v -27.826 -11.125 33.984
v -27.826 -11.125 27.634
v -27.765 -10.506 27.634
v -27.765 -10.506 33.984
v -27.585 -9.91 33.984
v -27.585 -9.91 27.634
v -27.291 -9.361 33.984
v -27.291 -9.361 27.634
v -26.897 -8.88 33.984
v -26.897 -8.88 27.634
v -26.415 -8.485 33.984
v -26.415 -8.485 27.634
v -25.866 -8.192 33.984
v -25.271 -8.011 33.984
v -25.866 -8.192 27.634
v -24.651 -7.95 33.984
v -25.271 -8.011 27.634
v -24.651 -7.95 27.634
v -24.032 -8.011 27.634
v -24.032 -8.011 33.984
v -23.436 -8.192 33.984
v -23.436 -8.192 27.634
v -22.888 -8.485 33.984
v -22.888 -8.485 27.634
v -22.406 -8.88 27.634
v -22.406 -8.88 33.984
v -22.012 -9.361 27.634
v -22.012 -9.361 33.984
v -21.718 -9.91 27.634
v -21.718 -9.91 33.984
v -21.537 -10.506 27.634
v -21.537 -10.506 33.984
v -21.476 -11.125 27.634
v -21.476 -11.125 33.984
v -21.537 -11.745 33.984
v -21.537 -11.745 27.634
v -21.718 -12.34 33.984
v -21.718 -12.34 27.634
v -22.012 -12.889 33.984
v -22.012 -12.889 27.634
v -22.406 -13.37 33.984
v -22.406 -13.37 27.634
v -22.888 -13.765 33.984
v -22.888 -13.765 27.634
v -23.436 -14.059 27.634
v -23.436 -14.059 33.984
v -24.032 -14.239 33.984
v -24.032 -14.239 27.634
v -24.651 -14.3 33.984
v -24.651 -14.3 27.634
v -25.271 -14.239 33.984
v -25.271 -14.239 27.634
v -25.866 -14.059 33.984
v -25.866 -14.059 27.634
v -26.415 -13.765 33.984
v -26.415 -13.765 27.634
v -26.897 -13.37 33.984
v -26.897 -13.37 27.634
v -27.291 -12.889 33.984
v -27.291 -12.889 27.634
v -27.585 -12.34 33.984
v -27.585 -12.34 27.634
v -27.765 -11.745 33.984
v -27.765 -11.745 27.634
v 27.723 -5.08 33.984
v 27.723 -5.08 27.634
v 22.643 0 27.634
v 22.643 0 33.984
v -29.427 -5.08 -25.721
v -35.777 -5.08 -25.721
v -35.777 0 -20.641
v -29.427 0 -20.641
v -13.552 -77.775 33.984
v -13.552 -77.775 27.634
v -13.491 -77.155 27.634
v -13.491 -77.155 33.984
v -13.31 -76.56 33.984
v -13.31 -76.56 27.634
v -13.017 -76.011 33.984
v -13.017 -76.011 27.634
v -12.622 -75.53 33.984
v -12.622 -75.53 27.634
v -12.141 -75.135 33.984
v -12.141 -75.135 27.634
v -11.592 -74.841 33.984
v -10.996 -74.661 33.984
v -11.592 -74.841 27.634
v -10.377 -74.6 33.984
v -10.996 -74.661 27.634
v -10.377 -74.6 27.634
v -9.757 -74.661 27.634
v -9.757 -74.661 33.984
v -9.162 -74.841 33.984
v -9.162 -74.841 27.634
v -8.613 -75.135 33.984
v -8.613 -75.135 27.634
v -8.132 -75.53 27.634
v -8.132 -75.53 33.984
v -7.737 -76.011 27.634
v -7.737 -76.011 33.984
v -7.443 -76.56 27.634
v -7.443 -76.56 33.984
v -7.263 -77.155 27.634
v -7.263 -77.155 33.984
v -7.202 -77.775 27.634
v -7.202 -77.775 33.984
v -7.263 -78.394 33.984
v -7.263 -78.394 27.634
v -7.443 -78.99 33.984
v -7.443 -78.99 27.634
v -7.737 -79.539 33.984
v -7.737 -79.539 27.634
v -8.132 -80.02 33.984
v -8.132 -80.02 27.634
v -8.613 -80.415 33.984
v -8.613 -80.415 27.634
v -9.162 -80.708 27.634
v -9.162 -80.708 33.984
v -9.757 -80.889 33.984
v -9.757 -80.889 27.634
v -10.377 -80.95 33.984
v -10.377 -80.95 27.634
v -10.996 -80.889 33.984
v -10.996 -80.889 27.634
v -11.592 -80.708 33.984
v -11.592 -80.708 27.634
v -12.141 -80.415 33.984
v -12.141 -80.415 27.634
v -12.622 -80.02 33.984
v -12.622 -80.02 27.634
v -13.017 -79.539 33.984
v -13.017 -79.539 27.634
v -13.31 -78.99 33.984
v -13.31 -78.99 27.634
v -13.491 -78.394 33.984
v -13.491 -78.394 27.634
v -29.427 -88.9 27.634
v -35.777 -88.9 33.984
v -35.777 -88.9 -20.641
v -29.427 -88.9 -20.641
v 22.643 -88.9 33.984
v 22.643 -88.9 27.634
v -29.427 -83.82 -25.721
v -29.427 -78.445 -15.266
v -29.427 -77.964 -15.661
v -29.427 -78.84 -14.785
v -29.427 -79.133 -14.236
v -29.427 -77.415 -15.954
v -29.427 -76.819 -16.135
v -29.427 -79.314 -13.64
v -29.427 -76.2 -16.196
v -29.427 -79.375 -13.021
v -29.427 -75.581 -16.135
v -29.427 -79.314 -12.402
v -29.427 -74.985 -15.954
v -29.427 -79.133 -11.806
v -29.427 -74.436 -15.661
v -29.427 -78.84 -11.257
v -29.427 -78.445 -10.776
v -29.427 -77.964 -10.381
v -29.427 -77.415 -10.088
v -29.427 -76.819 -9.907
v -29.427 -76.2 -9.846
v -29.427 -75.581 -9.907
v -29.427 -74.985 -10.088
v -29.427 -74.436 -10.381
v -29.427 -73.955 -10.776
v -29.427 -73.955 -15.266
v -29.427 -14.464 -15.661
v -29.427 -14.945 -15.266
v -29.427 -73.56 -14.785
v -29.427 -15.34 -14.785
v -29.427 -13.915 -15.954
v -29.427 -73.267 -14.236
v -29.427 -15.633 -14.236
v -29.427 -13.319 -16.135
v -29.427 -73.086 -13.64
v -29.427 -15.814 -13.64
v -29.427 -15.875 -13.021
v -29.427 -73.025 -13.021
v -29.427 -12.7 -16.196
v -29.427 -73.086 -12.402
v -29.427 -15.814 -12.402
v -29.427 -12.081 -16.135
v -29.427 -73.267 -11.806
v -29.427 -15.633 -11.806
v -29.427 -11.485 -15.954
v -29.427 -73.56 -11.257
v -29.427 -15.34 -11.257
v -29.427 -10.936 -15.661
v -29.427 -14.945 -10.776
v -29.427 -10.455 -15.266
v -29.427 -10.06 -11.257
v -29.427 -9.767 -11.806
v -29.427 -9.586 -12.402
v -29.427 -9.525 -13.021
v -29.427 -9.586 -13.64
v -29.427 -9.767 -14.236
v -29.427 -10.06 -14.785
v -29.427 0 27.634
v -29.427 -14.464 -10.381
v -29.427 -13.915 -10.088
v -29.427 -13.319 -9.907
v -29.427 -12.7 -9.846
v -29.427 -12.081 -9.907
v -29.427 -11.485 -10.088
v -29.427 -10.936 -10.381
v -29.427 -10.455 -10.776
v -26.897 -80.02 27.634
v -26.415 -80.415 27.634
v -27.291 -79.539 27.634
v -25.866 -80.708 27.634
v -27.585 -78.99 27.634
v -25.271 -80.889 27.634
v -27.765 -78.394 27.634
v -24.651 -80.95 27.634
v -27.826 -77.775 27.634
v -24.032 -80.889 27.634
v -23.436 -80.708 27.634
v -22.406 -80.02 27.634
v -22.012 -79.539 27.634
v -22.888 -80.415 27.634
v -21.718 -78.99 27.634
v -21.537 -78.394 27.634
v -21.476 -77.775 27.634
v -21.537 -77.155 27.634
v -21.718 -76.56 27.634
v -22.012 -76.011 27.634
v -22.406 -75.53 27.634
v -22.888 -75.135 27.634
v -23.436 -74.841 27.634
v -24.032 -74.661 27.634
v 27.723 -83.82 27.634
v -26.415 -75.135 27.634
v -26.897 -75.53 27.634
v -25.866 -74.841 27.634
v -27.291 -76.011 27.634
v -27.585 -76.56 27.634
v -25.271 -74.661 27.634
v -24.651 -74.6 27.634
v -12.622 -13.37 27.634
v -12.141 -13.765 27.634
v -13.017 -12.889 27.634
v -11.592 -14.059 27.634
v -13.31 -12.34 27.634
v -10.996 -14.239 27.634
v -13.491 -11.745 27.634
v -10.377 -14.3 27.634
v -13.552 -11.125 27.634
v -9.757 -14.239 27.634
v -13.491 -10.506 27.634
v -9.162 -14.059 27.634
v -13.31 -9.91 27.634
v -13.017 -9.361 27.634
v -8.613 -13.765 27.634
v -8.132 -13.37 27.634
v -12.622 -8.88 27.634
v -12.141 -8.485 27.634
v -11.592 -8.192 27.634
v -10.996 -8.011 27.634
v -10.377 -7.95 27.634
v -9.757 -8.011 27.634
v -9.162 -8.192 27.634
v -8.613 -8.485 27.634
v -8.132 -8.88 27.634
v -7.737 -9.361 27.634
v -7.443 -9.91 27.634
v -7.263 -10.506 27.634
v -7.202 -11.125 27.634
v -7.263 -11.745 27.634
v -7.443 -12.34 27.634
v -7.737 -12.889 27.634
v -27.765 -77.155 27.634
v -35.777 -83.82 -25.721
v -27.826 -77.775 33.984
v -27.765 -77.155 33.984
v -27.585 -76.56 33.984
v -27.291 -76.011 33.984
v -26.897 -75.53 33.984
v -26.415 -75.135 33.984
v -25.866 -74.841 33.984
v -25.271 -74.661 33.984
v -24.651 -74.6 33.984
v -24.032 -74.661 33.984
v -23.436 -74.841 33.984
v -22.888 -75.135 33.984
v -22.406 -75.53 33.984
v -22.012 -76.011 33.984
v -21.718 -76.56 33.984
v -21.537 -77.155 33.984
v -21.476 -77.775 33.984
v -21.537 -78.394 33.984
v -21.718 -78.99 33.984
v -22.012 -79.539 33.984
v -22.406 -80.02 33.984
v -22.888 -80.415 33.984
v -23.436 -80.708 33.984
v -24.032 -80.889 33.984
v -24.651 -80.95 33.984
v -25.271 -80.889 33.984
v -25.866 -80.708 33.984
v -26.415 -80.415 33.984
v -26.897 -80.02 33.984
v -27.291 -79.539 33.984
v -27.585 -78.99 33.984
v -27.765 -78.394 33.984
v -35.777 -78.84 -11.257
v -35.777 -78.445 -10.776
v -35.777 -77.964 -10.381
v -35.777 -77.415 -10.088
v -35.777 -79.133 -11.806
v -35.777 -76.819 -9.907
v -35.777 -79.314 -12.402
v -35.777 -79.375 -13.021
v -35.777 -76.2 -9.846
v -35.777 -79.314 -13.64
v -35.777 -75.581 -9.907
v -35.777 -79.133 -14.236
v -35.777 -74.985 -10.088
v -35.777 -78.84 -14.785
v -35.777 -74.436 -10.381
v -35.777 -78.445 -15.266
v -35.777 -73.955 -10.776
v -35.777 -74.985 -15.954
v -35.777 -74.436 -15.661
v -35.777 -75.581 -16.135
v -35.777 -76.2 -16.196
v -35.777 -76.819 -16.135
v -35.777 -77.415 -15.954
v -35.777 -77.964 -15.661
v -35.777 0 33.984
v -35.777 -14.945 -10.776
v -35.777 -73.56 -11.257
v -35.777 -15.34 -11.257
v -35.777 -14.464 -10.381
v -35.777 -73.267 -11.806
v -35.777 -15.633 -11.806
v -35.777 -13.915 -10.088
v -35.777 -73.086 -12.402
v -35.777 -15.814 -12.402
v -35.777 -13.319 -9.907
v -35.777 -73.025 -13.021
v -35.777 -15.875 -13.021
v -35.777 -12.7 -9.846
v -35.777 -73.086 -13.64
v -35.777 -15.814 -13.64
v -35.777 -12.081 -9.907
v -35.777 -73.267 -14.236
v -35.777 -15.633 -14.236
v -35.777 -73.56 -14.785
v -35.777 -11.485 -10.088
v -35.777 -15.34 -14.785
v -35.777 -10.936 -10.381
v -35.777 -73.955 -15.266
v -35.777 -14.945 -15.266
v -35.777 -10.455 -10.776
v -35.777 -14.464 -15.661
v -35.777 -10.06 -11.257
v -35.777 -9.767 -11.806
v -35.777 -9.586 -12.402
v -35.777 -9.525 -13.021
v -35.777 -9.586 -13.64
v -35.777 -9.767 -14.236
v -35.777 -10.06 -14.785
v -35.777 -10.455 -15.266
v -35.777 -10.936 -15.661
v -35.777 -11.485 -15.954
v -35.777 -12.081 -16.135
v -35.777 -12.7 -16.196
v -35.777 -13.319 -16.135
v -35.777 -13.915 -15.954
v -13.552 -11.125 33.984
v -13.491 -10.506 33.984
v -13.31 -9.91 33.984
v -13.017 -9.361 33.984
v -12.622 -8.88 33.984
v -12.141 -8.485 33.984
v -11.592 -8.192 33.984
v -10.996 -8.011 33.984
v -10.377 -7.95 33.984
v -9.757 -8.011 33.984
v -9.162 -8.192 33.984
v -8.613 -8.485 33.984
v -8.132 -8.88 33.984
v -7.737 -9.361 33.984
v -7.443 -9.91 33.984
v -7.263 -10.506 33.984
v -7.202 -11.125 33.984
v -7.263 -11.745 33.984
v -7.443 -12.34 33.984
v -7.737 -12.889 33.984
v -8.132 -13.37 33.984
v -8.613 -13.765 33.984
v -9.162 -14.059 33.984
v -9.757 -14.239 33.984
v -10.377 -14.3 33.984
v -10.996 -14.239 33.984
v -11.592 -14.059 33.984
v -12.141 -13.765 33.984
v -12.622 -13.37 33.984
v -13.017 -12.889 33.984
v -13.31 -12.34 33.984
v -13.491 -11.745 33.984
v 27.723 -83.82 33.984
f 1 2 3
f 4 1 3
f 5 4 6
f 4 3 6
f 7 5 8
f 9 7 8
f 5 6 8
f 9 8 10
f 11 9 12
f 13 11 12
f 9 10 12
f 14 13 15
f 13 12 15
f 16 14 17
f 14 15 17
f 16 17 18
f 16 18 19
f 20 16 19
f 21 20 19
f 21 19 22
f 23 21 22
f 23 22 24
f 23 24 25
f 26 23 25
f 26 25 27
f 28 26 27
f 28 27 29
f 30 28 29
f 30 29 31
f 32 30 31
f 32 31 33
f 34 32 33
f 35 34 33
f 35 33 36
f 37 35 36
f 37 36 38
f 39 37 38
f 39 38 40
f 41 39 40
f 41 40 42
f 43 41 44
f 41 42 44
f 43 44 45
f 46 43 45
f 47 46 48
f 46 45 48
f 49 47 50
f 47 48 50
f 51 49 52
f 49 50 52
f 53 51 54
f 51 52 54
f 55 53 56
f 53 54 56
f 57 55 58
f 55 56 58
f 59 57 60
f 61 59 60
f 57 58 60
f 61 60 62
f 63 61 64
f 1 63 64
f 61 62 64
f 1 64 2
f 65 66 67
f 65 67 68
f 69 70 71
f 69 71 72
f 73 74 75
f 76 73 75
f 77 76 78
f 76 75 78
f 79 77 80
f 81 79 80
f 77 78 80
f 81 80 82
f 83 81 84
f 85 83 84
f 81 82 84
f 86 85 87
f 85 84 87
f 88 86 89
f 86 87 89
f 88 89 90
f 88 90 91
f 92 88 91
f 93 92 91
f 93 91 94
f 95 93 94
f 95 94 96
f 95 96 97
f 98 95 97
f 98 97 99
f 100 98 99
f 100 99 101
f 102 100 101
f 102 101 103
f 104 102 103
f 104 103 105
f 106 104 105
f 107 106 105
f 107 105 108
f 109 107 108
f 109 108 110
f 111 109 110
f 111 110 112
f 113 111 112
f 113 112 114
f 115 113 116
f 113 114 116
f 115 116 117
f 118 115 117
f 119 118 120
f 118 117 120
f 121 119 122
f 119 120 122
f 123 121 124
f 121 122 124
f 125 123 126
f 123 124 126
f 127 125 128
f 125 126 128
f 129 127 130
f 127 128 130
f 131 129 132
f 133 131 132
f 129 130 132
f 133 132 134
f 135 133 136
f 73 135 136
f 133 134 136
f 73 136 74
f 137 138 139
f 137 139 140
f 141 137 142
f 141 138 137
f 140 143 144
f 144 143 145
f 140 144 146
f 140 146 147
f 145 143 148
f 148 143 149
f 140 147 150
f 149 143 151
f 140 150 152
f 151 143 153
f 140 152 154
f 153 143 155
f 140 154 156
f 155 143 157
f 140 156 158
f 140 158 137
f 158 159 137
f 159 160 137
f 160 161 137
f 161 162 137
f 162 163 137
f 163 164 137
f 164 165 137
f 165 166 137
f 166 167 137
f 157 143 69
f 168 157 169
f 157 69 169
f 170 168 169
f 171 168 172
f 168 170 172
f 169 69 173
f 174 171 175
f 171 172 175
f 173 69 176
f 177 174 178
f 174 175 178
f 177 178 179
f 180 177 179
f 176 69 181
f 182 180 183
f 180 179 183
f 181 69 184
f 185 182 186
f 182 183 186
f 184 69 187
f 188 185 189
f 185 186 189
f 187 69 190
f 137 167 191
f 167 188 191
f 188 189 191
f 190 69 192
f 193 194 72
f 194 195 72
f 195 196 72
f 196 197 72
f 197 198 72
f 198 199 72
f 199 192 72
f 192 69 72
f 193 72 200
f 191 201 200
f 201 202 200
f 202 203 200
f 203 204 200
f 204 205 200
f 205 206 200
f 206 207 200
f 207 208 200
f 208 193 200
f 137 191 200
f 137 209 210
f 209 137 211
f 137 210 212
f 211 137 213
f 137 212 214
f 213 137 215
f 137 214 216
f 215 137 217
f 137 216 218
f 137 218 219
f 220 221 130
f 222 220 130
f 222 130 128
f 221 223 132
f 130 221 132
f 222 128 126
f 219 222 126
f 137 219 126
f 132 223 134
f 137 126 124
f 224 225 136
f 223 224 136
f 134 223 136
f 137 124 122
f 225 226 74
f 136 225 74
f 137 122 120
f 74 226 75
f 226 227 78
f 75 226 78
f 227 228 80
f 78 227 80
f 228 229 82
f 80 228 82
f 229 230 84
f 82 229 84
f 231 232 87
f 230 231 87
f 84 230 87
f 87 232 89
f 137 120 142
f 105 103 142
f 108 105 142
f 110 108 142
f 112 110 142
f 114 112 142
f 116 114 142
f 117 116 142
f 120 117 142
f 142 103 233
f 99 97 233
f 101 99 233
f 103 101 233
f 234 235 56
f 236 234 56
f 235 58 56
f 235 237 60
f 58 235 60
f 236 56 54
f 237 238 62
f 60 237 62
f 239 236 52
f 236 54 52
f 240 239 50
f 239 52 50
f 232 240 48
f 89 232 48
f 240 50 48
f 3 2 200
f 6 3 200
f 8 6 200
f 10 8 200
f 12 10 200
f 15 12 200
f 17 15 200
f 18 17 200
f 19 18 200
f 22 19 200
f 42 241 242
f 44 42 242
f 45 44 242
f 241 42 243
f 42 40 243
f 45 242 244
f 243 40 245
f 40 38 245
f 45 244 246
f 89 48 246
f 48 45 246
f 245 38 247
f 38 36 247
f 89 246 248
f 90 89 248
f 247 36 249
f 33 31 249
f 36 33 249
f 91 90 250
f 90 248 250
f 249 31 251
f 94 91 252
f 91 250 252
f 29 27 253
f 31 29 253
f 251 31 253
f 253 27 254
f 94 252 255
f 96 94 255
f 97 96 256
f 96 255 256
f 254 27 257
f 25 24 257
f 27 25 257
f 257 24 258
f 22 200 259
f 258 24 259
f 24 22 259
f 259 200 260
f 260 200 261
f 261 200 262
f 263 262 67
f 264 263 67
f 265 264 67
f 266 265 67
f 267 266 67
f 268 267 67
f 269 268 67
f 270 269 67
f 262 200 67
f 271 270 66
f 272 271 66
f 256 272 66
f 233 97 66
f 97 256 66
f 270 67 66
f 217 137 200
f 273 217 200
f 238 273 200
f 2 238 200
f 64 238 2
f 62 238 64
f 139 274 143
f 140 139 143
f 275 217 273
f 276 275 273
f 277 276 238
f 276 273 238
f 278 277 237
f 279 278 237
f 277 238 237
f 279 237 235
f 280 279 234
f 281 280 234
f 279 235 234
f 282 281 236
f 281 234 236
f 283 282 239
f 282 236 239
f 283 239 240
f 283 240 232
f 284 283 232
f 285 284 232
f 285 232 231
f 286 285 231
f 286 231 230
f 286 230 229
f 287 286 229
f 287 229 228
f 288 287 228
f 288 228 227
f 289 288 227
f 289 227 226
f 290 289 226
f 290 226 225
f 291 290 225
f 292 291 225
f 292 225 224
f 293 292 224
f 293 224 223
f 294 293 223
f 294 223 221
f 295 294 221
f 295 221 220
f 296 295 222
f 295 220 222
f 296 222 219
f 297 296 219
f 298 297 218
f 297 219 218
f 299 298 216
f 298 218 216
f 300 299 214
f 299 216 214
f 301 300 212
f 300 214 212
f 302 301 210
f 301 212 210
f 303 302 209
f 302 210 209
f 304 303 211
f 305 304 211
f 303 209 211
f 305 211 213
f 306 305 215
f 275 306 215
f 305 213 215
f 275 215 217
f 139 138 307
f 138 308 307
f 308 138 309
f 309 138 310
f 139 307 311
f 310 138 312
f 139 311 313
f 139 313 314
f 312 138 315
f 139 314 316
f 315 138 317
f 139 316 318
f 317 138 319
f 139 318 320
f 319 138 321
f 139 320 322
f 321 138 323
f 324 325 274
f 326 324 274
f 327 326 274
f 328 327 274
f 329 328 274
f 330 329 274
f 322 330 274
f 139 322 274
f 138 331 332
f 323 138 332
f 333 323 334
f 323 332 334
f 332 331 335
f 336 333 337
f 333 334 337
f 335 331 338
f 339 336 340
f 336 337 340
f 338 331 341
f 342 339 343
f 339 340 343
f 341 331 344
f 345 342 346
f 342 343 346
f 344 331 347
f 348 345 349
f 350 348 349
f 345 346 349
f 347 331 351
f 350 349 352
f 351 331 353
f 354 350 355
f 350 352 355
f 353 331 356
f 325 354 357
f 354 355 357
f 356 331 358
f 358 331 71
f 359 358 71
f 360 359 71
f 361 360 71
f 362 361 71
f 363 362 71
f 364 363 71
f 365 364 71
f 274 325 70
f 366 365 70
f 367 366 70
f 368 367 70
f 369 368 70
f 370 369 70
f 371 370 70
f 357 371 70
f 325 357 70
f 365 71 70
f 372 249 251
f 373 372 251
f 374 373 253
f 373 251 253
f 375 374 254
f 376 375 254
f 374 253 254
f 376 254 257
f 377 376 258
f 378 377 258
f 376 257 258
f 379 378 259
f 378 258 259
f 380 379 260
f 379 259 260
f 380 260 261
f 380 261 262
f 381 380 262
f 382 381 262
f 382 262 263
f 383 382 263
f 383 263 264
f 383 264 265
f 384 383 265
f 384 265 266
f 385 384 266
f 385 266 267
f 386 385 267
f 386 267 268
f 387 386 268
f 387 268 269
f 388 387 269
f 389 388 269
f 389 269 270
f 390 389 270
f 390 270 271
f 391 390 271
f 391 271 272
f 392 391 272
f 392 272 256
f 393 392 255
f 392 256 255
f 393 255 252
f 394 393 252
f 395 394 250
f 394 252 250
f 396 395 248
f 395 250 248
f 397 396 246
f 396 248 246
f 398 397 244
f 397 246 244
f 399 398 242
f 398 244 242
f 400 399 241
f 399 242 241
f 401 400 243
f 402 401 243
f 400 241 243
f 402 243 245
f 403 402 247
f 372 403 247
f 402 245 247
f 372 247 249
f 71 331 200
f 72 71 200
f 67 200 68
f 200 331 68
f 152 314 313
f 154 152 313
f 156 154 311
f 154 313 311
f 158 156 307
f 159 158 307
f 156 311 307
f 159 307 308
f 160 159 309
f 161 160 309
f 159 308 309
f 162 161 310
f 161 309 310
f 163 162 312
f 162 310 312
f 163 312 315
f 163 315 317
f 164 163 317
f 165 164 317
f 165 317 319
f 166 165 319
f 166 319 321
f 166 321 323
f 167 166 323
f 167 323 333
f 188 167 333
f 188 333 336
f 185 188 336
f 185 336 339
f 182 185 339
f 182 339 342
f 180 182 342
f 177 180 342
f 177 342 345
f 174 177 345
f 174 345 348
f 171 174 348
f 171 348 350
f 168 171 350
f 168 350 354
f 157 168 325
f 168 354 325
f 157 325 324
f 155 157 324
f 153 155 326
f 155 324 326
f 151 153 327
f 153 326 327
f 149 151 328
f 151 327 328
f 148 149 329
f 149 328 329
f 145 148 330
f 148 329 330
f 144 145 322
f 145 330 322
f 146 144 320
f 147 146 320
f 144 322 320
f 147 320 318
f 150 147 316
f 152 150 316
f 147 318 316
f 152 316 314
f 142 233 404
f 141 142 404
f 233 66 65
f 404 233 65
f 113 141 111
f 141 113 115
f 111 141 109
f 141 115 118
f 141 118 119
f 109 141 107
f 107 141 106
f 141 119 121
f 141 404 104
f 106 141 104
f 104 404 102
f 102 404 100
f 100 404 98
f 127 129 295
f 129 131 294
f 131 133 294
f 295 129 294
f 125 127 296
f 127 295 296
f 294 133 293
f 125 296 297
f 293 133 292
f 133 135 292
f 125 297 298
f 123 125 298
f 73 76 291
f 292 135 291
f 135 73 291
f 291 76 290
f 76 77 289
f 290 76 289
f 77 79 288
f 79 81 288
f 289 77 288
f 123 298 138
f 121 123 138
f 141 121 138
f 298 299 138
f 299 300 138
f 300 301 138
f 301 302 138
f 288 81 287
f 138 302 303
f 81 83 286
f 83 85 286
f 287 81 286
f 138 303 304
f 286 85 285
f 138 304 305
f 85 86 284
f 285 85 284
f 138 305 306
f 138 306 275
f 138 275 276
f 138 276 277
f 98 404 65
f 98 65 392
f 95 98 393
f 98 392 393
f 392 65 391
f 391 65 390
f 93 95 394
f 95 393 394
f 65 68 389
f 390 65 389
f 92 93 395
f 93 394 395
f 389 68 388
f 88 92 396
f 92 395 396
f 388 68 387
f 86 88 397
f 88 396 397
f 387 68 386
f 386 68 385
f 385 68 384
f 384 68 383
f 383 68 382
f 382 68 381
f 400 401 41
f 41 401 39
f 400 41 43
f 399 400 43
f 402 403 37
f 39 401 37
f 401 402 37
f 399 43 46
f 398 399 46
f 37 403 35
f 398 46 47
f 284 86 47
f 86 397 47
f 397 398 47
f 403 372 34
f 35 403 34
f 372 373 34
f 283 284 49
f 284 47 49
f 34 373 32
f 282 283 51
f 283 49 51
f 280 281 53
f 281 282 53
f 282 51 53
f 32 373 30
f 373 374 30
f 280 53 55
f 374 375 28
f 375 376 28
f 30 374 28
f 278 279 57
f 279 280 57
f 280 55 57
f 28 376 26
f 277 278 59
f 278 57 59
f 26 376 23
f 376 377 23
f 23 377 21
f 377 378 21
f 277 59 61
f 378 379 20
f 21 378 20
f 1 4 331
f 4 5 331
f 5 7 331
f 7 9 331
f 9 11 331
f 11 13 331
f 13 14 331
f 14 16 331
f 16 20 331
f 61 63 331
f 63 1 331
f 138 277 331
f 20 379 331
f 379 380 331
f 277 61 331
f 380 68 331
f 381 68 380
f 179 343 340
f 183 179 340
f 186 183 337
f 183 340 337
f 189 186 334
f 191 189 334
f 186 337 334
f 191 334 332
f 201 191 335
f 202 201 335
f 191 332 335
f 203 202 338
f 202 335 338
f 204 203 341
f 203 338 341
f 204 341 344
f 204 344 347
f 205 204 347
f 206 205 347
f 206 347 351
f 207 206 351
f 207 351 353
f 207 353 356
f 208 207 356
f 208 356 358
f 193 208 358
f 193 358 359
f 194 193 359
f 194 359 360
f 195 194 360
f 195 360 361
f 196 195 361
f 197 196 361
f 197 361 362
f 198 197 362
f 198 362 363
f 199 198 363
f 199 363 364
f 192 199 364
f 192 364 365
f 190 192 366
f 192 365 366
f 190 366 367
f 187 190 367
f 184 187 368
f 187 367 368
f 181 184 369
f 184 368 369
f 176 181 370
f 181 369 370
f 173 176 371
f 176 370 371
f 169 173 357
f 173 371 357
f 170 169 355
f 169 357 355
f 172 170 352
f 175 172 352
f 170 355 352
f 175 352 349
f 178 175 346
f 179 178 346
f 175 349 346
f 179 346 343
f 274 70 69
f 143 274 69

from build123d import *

# Parameters (mm, degrees)
F1_DEPTH = 88.9
F3_D     = 6.35
F4_SIZE  = 5.08
F6_D     = 6.35


with BuildPart() as f1:
    # F0 (on Front) → F1 (new body)
    with BuildSketch(Plane.XZ):
        Polygon((27.723321, 33.983968), (-29.426679, 33.983968), (-35.776679, 33.983968), (-35.776679, -25.72097), (-29.426679, -25.72097), (-29.426679, 27.633968), (27.723321, 27.633968), align=None)
    extrude(amount=F1_DEPTH)

    # F3 (through all)
    with Locations(Plane.YZ.offset(-29.426679)):
        with Locations((-76.2, -13.02097), (-12.7, -13.02097)):
            Hole(F3_D / 2)

    # F4
    f4_edges = [f1.edges().sort_by_distance(p)[0] for p in [
        (-32.601679, -88.9, -25.72097),
        (27.723321, -88.9, 30.808968),
        (27.723321, 0, 30.808968),
        (-32.601679, 0, -25.72097),
    ]]
    chamfer(f4_edges, length=F4_SIZE)

    # F6 (through all)
    with Locations(Plane.XY.offset(33.983968)):
        with Locations((-10.376679, -11.1252), (-24.651479, -11.1252), (-24.651479, -77.7748), (-10.376679, -77.7748)):
            Hole(F6_D / 2)


solid = f1.part
